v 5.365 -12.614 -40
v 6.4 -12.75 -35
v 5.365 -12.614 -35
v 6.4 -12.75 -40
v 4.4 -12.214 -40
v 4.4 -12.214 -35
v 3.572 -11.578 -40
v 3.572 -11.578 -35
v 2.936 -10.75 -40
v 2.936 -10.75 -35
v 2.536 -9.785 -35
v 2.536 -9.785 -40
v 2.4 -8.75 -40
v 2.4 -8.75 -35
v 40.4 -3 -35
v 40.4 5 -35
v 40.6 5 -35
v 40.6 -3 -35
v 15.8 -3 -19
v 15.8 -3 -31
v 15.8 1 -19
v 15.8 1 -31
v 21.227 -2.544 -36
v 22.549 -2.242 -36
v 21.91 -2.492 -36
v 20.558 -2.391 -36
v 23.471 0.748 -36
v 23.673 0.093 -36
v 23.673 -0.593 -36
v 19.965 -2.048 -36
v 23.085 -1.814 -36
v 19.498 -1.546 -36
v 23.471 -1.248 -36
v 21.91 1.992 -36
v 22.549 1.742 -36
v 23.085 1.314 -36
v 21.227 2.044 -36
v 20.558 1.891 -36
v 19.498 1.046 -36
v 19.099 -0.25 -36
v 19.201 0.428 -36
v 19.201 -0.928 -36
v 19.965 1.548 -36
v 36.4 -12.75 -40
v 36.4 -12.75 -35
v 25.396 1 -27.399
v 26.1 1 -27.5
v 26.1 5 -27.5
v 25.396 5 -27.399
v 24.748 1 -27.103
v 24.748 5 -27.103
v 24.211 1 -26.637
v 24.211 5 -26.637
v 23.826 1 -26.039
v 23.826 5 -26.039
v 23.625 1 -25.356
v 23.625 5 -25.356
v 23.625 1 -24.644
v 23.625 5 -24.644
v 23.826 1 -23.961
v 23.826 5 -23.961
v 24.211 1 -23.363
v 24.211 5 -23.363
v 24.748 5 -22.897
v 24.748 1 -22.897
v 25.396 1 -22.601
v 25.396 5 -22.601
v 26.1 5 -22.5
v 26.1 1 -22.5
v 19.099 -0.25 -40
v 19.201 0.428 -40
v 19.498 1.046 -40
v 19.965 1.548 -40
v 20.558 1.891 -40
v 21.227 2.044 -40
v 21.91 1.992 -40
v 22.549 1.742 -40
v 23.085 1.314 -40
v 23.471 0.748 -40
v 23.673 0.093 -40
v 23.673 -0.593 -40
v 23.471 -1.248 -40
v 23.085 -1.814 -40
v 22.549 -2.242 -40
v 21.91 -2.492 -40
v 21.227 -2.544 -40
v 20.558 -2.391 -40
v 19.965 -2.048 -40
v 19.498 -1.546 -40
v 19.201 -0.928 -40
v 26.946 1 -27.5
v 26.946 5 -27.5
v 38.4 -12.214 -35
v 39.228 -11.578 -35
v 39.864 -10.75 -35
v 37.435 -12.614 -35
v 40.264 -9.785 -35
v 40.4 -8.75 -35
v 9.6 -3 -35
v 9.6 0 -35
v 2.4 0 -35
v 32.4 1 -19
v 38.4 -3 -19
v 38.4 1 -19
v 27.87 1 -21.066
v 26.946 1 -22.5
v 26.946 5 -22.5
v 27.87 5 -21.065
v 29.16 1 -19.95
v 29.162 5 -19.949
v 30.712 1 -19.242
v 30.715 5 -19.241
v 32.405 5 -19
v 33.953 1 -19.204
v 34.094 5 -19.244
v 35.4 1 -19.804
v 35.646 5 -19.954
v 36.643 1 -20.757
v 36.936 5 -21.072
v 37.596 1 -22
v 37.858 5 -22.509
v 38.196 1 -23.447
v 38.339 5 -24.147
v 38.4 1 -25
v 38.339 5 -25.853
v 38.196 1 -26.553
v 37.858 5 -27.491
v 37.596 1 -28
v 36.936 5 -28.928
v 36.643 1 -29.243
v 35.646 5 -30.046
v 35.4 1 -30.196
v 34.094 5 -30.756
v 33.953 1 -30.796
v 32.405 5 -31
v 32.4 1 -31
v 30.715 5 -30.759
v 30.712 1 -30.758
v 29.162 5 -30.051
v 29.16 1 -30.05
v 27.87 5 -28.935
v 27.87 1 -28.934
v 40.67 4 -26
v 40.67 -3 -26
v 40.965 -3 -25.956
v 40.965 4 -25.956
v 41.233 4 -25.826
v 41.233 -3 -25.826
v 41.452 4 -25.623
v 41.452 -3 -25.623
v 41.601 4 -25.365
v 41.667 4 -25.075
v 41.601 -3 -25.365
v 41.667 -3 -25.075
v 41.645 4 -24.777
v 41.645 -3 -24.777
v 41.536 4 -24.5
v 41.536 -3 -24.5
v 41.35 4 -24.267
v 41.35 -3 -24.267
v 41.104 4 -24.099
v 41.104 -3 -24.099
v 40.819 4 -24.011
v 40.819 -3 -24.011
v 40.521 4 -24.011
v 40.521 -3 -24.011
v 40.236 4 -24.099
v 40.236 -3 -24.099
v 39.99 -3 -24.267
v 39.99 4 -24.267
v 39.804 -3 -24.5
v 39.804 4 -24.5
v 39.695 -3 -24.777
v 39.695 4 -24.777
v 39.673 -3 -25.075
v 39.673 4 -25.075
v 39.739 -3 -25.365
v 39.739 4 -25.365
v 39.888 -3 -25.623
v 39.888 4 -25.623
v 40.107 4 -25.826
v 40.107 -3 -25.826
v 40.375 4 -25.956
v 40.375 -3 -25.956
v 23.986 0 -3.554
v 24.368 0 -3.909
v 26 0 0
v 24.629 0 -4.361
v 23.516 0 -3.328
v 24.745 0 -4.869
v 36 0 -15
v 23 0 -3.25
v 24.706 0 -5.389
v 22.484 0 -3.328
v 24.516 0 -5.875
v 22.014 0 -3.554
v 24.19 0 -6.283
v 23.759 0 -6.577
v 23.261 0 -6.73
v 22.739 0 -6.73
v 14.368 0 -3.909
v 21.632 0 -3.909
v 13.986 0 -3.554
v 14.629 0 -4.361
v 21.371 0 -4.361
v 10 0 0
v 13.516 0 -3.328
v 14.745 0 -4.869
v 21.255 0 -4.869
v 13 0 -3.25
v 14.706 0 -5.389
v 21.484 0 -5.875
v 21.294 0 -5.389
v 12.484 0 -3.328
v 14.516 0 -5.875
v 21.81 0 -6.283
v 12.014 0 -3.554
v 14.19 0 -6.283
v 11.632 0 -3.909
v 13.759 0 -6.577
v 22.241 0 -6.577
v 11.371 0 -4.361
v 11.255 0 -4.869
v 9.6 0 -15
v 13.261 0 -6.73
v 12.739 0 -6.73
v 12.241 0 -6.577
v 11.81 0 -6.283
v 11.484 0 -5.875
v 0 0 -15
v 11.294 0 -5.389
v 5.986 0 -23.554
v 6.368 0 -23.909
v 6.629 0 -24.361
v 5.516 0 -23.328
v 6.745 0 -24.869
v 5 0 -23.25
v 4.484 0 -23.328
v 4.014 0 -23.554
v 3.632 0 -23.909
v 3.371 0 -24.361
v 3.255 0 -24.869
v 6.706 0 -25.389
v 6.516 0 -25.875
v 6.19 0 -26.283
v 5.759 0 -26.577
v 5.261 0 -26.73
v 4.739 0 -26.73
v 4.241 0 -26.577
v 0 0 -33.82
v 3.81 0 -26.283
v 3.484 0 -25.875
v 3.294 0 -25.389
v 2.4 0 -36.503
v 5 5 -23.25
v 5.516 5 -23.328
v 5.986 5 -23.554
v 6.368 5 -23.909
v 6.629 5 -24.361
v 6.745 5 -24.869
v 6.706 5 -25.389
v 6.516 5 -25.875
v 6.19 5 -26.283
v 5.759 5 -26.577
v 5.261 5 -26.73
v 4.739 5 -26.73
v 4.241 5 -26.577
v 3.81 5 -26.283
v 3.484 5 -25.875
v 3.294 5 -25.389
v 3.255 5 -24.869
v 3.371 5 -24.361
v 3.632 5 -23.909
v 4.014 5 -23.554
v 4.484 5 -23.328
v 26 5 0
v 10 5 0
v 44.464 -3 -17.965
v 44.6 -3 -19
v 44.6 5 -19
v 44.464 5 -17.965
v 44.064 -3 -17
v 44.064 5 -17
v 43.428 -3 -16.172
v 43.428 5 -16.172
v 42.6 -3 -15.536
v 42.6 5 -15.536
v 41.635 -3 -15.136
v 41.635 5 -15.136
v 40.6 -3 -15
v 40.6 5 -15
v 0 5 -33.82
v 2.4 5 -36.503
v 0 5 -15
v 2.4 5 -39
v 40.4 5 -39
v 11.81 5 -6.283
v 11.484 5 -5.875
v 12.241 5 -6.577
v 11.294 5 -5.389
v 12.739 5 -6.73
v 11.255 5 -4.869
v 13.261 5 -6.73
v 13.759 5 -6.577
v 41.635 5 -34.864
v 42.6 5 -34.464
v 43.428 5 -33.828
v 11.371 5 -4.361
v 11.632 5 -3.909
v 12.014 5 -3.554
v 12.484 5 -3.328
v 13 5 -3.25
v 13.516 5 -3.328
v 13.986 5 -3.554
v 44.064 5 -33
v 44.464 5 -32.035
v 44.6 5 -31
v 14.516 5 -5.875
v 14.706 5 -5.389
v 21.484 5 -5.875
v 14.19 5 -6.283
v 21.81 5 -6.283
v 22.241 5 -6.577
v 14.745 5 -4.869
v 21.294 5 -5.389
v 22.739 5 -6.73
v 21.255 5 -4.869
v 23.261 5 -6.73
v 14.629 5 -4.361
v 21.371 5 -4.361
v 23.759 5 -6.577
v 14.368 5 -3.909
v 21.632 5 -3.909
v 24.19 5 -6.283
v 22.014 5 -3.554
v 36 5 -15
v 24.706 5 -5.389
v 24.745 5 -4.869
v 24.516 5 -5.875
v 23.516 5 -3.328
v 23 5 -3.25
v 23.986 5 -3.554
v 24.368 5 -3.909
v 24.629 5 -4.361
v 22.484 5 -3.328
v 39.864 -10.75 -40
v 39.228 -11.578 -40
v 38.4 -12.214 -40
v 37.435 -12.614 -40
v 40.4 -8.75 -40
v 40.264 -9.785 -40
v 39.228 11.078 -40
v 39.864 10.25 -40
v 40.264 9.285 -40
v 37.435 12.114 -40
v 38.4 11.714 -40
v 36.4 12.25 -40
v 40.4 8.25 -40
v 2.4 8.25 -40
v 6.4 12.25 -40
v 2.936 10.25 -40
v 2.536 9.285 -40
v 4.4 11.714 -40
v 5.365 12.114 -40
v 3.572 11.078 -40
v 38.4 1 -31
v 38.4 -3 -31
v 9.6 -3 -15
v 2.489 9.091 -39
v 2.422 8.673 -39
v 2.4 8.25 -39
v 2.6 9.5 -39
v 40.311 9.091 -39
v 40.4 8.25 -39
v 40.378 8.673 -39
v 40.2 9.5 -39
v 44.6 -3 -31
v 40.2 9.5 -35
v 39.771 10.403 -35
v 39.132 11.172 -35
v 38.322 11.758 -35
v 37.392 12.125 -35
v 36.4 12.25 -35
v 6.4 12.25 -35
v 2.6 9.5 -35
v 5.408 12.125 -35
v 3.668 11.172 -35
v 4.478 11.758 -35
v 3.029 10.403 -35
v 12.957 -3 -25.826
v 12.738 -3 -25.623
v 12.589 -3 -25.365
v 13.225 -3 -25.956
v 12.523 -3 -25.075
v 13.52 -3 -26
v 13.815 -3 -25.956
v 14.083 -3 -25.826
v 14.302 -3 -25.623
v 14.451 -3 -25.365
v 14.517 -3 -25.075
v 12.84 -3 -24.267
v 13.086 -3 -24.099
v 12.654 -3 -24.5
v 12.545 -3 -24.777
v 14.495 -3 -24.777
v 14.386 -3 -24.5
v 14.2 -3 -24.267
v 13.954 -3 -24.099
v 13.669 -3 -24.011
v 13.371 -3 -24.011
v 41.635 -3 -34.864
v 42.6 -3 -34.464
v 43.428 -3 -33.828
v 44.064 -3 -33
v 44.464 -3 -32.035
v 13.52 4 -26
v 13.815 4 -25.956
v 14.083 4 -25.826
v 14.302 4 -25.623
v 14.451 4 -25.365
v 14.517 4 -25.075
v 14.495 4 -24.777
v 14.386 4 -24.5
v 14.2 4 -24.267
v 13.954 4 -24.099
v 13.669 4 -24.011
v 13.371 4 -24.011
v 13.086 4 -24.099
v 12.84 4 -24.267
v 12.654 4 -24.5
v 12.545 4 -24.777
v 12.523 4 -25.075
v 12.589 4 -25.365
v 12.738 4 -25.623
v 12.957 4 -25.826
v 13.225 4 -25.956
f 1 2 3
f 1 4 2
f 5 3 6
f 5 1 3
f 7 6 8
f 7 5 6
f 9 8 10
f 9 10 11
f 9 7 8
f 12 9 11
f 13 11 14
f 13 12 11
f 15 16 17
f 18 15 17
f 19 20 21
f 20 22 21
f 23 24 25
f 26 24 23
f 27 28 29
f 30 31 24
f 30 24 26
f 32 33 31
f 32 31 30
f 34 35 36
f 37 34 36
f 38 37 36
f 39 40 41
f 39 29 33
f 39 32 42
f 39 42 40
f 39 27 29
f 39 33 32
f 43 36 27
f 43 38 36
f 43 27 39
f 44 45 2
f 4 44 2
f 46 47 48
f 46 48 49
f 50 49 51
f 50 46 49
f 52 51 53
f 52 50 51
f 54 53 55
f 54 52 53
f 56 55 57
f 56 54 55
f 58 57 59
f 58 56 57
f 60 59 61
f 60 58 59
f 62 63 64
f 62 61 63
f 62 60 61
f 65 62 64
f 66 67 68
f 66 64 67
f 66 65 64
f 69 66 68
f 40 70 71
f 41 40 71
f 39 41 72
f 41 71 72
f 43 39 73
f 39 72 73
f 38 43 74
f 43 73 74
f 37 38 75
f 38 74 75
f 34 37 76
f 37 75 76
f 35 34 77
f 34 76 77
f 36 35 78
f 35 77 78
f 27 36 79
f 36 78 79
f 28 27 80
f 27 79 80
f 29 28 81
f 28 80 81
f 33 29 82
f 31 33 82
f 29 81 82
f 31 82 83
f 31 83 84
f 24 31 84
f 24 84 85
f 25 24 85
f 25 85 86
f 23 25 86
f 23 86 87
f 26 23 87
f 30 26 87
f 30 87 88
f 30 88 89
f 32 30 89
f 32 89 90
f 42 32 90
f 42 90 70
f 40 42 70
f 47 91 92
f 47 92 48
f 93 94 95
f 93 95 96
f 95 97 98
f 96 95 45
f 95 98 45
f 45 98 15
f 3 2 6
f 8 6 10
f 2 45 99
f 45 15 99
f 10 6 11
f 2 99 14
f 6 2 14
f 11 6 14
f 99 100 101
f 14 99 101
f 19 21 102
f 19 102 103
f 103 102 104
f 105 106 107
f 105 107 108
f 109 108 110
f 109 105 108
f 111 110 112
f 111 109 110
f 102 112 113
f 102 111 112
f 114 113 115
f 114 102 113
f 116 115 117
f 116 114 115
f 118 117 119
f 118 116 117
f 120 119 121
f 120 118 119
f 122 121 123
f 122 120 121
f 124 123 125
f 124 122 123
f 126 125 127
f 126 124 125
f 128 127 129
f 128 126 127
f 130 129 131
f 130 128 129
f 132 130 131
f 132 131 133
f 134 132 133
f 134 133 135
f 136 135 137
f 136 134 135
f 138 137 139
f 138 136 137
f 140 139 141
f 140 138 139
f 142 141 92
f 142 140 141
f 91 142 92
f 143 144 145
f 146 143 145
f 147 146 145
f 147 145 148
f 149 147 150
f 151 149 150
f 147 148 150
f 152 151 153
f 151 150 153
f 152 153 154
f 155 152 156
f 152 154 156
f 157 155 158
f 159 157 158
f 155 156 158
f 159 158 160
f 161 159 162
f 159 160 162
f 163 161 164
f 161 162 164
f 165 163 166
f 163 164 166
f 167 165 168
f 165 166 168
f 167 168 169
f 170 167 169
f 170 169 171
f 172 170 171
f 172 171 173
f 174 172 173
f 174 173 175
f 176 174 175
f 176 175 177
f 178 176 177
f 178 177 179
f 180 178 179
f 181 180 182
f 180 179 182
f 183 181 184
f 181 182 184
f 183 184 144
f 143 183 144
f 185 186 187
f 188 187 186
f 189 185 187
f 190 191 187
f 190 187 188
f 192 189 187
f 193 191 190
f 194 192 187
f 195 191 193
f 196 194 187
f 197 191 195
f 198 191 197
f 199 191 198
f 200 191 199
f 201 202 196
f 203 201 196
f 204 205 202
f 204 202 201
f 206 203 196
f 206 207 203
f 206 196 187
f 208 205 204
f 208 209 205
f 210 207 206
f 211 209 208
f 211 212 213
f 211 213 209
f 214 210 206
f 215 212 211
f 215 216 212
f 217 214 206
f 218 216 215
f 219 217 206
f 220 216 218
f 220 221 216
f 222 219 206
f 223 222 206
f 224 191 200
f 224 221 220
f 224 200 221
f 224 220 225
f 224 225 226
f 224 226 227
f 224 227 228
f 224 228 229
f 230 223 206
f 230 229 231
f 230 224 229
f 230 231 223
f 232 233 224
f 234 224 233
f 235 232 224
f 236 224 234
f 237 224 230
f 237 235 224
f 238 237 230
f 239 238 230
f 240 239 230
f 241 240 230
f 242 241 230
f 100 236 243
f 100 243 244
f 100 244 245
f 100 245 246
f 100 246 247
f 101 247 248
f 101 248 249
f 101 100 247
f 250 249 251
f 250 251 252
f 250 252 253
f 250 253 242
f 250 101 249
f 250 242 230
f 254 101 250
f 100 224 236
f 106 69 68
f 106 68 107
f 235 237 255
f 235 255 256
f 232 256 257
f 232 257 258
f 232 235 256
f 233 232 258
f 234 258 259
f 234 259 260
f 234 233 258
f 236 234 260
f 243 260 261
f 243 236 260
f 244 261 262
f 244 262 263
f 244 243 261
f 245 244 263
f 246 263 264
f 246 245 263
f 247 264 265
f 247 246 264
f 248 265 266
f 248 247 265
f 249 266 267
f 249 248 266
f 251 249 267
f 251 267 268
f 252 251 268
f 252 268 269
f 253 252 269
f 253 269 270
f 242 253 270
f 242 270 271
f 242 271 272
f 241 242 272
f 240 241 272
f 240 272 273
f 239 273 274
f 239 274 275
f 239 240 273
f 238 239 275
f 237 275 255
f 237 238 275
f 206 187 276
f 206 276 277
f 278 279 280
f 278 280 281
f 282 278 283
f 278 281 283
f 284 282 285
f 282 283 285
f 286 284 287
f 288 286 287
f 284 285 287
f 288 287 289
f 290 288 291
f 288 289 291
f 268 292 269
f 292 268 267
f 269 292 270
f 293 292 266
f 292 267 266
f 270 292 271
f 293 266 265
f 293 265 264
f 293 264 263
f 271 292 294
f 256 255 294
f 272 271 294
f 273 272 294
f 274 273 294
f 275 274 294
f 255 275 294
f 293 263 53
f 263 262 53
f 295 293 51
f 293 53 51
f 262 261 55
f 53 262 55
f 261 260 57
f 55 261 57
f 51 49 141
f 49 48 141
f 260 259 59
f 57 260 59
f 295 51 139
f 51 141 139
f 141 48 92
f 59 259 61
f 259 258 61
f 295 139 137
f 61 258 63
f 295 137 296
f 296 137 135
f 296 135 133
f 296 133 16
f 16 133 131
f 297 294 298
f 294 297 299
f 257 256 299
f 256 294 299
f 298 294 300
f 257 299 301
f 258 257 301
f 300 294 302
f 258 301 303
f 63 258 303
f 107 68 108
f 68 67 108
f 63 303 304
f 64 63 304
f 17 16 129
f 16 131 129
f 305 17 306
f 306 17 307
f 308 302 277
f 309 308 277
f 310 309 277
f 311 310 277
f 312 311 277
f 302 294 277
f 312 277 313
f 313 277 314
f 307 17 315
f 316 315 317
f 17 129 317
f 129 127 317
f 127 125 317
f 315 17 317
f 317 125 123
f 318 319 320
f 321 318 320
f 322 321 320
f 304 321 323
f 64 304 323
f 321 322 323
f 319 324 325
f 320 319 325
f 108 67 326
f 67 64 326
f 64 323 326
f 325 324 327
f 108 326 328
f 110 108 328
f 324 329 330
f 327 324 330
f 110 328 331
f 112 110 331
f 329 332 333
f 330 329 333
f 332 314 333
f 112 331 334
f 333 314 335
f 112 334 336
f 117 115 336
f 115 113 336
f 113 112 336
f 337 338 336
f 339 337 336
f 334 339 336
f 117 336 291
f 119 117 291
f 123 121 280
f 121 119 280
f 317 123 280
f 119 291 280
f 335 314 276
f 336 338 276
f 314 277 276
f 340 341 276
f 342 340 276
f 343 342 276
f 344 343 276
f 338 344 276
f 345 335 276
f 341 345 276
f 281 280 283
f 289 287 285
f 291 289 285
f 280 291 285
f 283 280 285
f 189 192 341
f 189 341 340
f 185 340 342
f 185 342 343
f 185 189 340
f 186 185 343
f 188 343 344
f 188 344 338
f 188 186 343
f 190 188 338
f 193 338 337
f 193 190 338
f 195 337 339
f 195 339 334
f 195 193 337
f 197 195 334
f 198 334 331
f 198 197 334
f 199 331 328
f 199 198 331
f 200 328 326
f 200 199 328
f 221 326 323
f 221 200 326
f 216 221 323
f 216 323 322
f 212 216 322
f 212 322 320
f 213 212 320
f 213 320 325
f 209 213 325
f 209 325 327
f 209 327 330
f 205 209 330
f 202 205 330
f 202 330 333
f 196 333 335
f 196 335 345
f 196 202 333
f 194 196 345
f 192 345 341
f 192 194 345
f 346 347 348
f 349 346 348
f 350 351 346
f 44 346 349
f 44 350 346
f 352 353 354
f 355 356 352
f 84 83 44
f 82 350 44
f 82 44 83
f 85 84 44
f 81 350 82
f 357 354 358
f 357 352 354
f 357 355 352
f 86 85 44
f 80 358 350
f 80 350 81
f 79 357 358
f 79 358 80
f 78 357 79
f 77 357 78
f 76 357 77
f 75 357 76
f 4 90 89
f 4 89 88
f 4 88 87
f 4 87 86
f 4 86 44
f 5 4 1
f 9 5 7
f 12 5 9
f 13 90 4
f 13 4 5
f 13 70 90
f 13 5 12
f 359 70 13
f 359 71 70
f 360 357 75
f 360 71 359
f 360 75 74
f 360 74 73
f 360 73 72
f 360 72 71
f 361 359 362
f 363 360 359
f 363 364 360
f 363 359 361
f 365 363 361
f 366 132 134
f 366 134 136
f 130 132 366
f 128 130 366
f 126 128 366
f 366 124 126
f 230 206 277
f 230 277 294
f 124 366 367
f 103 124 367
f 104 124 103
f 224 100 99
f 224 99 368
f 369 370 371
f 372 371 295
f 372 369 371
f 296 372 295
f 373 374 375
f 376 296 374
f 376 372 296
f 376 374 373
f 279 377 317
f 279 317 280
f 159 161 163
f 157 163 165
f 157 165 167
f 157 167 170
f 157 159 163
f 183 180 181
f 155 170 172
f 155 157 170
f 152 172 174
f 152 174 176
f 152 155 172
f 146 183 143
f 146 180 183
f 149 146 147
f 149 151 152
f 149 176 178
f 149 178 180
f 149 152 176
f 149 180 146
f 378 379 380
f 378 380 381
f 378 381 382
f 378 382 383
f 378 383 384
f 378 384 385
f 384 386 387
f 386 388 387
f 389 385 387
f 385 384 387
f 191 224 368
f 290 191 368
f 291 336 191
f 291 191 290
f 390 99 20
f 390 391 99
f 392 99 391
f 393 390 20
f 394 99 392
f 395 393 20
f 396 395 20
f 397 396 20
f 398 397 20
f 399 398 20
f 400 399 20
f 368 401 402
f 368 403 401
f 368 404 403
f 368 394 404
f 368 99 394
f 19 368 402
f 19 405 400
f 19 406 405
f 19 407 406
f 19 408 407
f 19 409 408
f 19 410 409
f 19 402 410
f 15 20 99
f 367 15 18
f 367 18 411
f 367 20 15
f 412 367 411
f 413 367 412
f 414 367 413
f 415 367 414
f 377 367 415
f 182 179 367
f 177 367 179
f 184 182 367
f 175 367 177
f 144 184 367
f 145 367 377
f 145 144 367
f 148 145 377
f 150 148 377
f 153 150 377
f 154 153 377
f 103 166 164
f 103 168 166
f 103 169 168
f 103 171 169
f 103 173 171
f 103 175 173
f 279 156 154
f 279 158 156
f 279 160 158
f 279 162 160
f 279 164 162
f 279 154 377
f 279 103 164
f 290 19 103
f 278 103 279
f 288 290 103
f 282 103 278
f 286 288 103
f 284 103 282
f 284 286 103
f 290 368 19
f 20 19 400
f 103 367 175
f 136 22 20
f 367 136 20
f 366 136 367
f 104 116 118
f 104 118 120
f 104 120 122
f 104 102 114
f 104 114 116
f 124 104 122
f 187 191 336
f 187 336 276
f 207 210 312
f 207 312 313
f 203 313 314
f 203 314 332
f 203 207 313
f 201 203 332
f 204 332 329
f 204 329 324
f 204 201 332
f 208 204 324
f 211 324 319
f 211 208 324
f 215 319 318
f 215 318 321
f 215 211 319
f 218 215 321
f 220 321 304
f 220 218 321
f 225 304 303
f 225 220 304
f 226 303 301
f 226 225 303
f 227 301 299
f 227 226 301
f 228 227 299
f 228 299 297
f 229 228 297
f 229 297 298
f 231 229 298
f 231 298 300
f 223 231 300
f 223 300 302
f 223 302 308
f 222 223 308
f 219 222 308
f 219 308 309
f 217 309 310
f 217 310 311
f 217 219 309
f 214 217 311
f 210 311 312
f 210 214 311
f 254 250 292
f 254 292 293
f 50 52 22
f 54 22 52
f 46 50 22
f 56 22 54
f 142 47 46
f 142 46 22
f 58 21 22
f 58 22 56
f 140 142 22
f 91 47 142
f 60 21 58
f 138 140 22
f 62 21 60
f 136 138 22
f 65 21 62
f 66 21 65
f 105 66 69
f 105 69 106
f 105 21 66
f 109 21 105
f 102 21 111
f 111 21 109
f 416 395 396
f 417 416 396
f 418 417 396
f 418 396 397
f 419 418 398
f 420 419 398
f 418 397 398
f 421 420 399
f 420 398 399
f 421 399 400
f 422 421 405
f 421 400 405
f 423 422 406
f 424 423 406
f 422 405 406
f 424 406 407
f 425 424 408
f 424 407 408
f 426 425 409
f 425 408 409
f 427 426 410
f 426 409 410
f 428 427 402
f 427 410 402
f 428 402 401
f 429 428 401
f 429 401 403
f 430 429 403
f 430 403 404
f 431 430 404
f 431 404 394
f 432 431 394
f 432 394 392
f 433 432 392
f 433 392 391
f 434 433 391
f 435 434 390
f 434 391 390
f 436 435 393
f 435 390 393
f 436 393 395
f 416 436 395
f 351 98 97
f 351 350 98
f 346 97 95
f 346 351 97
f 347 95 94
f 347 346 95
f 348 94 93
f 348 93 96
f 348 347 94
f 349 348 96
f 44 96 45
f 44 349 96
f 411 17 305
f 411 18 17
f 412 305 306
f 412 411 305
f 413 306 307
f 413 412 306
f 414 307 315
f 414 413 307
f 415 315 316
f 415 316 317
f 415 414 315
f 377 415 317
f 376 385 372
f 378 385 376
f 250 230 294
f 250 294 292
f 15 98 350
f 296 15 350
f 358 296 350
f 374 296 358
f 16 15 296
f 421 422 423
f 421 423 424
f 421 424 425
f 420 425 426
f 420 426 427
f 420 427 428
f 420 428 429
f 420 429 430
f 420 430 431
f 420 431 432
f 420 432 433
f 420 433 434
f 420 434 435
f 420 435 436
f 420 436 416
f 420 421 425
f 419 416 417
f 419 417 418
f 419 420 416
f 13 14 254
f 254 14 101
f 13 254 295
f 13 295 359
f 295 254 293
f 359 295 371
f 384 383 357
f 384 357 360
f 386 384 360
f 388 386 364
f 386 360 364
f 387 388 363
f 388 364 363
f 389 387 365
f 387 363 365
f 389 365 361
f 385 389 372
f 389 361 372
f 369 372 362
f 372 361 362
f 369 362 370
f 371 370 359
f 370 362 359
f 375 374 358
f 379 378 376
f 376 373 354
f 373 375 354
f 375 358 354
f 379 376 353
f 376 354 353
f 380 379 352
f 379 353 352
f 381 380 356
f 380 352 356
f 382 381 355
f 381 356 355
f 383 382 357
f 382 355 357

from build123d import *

# Parameters (mm, degrees)
SKETCH1_R           = 1.75
BOSS_EXTRUDE1_DEPTH = 5
SKETCH2_W           = 35
SKETCH2_H           = 20
SKETCH2_W_2         = 22.6
SKETCH2_H_2         = 12
BOSS_EXTRUDE2_DEPTH = 3
SKETCH3_W           = 15.4
SKETCH3_H           = 20
CUT_EXTRUDE1_DEPTH  = 76.166481892
SKETCH4_R           = 1
CUT_EXTRUDE2_DEPTH  = 7
SKETCH5_W           = 38
SKETCH5_H           = 25
BOSS_EXTRUDE3_DEPTH = 5
SKETCH6_R           = 2.3
CUT_EXTRUDE3_DEPTH  = 4
FILLET1_R           = 4
SKETCH2_2_W         = 22.6
SKETCH2_2_H         = 12
CUT_EXTRUDE4_DEPTH  = 1
CUT_EXTRUDE5_DEPTH  = 65.832264344
CUT_EXTRUDE6_DEPTH  = 65.627567647
SKETCH9_W           = 38
SKETCH9_H           = 4.5
CUT_EXTRUDE7_DEPTH  = 4


with BuildPart() as part:
    # Sketch1 → Boss-Extrude1 (new body)
    with BuildSketch(Plane(origin=(0, 0, 0), x_dir=(1, 0, 0), z_dir=(0, 1, 0))):
        Polygon((0, 15), (0, 33.819660113), (10, 45), (26, 45), (36, 35), (60, 35), (60, 15), (36, 15), (26, 0), (10, 0), align=None)
        with Locations((5, 25)):
            Circle(SKETCH1_R, mode=Mode.SUBTRACT)
        with Locations((13, 5)):
            Circle(SKETCH1_R, mode=Mode.SUBTRACT)
        with Locations((23, 5)):
            Circle(SKETCH1_R, mode=Mode.SUBTRACT)
    extrude(amount=BOSS_EXTRUDE1_DEPTH)

    # Sketch2 → Boss-Extrude2 (add)
    with BuildSketch(Plane.XZ):
        with Locations((27.1, -25)):
            Rectangle(SKETCH2_W, SKETCH2_H)
        with Locations((27.1, -25)):
            Rectangle(SKETCH2_W_2, SKETCH2_H_2, mode=Mode.SUBTRACT)
    extrude(amount=BOSS_EXTRUDE2_DEPTH)

    # Sketch3 → Cut-Extrude1 (cut, through all)
    with BuildSketch(Plane.XZ):
        with Locations((52.3, -25)):
            Rectangle(SKETCH3_W, SKETCH3_H)
    extrude(amount=-CUT_EXTRUDE1_DEPTH, mode=Mode.SUBTRACT)

    # Sketch4 → Cut-Extrude2 (cut)
    with BuildSketch(Plane.XZ.offset(3)):
        with Locations((13.52, -25)):
            Circle(SKETCH4_R)
        with Locations((40.67, -25)):
            Circle(SKETCH4_R)
    extrude(amount=-CUT_EXTRUDE2_DEPTH, mode=Mode.SUBTRACT)

    # Sketch5 → Boss-Extrude3 (add)
    with BuildSketch(Plane(origin=(0, 0, -35), x_dir=(-1, 0, 0), z_dir=(0, 0, -1))):
        with Locations((-21.4, -0.25)):
            Rectangle(SKETCH5_W, SKETCH5_H)
    extrude(amount=BOSS_EXTRUDE3_DEPTH)

    # Sketch6 → Cut-Extrude3 (cut)
    with BuildSketch(Plane(origin=(0, 0, -40), x_dir=(-1, 0, 0), z_dir=(0, 0, -1))):
        with Locations((-21.39853967, -0.25)):
            Circle(SKETCH6_R)
    extrude(amount=-CUT_EXTRUDE3_DEPTH, mode=Mode.SUBTRACT)

    # Fillet1
    fillet1_edges = [part.edges().sort_by_distance(p)[0] for p in [
        (2.4, -12.75, -37.5),
        (2.4, 12.25, -37.5),
        (40.4, 12.25, -37.5),
        (40.4, -12.75, -37.5),
        (44.6, 1, -35),
        (44.6, 1, -15),
    ]]
    fillet(fillet1_edges, radius=FILLET1_R)

    # Sketch2<2> → Cut-Extrude4 (cut)
    with BuildSketch(Plane.XZ):
        with Locations((27.1, -25)):
            Rectangle(SKETCH2_2_W, SKETCH2_2_H)
    extrude(amount=-CUT_EXTRUDE4_DEPTH, mode=Mode.SUBTRACT)

    # Sketch7 → Cut-Extrude5 (cut, through all)
    with BuildSketch(Plane.XZ.offset(-1)):
        with BuildLine():
            Line((26.1, -22.5), (26.945643943, -22.5))
            ThreePointArc((26.945643943, -22.5), (38.4, -25), (26.945643943, -27.5))
            Line((26.945643943, -27.5), (26.1, -27.5))
            ThreePointArc((26.1, -27.5), (23.6, -25), (26.1, -22.5))
        make_face()
    extrude(amount=-CUT_EXTRUDE5_DEPTH, mode=Mode.SUBTRACT)

    # Sketch8 → Cut-Extrude6 (cut, through all)
    with BuildSketch(Plane.XZ):
        Polygon((26, -45), (31, -40), (23.684912343, -40), (19.112166997, -40), (5.527864045, -40), (10, -45), align=None)
    extrude(amount=-CUT_EXTRUDE6_DEPTH, mode=Mode.SUBTRACT)

    # Sketch9 → Cut-Extrude7 (cut)
    with BuildSketch(Plane.XY.offset(-35)):
        with Locations((21.4, 7.25)):
            Rectangle(SKETCH9_W, SKETCH9_H)
    extrude(amount=-CUT_EXTRUDE7_DEPTH, mode=Mode.SUBTRACT)


solid = part.part
